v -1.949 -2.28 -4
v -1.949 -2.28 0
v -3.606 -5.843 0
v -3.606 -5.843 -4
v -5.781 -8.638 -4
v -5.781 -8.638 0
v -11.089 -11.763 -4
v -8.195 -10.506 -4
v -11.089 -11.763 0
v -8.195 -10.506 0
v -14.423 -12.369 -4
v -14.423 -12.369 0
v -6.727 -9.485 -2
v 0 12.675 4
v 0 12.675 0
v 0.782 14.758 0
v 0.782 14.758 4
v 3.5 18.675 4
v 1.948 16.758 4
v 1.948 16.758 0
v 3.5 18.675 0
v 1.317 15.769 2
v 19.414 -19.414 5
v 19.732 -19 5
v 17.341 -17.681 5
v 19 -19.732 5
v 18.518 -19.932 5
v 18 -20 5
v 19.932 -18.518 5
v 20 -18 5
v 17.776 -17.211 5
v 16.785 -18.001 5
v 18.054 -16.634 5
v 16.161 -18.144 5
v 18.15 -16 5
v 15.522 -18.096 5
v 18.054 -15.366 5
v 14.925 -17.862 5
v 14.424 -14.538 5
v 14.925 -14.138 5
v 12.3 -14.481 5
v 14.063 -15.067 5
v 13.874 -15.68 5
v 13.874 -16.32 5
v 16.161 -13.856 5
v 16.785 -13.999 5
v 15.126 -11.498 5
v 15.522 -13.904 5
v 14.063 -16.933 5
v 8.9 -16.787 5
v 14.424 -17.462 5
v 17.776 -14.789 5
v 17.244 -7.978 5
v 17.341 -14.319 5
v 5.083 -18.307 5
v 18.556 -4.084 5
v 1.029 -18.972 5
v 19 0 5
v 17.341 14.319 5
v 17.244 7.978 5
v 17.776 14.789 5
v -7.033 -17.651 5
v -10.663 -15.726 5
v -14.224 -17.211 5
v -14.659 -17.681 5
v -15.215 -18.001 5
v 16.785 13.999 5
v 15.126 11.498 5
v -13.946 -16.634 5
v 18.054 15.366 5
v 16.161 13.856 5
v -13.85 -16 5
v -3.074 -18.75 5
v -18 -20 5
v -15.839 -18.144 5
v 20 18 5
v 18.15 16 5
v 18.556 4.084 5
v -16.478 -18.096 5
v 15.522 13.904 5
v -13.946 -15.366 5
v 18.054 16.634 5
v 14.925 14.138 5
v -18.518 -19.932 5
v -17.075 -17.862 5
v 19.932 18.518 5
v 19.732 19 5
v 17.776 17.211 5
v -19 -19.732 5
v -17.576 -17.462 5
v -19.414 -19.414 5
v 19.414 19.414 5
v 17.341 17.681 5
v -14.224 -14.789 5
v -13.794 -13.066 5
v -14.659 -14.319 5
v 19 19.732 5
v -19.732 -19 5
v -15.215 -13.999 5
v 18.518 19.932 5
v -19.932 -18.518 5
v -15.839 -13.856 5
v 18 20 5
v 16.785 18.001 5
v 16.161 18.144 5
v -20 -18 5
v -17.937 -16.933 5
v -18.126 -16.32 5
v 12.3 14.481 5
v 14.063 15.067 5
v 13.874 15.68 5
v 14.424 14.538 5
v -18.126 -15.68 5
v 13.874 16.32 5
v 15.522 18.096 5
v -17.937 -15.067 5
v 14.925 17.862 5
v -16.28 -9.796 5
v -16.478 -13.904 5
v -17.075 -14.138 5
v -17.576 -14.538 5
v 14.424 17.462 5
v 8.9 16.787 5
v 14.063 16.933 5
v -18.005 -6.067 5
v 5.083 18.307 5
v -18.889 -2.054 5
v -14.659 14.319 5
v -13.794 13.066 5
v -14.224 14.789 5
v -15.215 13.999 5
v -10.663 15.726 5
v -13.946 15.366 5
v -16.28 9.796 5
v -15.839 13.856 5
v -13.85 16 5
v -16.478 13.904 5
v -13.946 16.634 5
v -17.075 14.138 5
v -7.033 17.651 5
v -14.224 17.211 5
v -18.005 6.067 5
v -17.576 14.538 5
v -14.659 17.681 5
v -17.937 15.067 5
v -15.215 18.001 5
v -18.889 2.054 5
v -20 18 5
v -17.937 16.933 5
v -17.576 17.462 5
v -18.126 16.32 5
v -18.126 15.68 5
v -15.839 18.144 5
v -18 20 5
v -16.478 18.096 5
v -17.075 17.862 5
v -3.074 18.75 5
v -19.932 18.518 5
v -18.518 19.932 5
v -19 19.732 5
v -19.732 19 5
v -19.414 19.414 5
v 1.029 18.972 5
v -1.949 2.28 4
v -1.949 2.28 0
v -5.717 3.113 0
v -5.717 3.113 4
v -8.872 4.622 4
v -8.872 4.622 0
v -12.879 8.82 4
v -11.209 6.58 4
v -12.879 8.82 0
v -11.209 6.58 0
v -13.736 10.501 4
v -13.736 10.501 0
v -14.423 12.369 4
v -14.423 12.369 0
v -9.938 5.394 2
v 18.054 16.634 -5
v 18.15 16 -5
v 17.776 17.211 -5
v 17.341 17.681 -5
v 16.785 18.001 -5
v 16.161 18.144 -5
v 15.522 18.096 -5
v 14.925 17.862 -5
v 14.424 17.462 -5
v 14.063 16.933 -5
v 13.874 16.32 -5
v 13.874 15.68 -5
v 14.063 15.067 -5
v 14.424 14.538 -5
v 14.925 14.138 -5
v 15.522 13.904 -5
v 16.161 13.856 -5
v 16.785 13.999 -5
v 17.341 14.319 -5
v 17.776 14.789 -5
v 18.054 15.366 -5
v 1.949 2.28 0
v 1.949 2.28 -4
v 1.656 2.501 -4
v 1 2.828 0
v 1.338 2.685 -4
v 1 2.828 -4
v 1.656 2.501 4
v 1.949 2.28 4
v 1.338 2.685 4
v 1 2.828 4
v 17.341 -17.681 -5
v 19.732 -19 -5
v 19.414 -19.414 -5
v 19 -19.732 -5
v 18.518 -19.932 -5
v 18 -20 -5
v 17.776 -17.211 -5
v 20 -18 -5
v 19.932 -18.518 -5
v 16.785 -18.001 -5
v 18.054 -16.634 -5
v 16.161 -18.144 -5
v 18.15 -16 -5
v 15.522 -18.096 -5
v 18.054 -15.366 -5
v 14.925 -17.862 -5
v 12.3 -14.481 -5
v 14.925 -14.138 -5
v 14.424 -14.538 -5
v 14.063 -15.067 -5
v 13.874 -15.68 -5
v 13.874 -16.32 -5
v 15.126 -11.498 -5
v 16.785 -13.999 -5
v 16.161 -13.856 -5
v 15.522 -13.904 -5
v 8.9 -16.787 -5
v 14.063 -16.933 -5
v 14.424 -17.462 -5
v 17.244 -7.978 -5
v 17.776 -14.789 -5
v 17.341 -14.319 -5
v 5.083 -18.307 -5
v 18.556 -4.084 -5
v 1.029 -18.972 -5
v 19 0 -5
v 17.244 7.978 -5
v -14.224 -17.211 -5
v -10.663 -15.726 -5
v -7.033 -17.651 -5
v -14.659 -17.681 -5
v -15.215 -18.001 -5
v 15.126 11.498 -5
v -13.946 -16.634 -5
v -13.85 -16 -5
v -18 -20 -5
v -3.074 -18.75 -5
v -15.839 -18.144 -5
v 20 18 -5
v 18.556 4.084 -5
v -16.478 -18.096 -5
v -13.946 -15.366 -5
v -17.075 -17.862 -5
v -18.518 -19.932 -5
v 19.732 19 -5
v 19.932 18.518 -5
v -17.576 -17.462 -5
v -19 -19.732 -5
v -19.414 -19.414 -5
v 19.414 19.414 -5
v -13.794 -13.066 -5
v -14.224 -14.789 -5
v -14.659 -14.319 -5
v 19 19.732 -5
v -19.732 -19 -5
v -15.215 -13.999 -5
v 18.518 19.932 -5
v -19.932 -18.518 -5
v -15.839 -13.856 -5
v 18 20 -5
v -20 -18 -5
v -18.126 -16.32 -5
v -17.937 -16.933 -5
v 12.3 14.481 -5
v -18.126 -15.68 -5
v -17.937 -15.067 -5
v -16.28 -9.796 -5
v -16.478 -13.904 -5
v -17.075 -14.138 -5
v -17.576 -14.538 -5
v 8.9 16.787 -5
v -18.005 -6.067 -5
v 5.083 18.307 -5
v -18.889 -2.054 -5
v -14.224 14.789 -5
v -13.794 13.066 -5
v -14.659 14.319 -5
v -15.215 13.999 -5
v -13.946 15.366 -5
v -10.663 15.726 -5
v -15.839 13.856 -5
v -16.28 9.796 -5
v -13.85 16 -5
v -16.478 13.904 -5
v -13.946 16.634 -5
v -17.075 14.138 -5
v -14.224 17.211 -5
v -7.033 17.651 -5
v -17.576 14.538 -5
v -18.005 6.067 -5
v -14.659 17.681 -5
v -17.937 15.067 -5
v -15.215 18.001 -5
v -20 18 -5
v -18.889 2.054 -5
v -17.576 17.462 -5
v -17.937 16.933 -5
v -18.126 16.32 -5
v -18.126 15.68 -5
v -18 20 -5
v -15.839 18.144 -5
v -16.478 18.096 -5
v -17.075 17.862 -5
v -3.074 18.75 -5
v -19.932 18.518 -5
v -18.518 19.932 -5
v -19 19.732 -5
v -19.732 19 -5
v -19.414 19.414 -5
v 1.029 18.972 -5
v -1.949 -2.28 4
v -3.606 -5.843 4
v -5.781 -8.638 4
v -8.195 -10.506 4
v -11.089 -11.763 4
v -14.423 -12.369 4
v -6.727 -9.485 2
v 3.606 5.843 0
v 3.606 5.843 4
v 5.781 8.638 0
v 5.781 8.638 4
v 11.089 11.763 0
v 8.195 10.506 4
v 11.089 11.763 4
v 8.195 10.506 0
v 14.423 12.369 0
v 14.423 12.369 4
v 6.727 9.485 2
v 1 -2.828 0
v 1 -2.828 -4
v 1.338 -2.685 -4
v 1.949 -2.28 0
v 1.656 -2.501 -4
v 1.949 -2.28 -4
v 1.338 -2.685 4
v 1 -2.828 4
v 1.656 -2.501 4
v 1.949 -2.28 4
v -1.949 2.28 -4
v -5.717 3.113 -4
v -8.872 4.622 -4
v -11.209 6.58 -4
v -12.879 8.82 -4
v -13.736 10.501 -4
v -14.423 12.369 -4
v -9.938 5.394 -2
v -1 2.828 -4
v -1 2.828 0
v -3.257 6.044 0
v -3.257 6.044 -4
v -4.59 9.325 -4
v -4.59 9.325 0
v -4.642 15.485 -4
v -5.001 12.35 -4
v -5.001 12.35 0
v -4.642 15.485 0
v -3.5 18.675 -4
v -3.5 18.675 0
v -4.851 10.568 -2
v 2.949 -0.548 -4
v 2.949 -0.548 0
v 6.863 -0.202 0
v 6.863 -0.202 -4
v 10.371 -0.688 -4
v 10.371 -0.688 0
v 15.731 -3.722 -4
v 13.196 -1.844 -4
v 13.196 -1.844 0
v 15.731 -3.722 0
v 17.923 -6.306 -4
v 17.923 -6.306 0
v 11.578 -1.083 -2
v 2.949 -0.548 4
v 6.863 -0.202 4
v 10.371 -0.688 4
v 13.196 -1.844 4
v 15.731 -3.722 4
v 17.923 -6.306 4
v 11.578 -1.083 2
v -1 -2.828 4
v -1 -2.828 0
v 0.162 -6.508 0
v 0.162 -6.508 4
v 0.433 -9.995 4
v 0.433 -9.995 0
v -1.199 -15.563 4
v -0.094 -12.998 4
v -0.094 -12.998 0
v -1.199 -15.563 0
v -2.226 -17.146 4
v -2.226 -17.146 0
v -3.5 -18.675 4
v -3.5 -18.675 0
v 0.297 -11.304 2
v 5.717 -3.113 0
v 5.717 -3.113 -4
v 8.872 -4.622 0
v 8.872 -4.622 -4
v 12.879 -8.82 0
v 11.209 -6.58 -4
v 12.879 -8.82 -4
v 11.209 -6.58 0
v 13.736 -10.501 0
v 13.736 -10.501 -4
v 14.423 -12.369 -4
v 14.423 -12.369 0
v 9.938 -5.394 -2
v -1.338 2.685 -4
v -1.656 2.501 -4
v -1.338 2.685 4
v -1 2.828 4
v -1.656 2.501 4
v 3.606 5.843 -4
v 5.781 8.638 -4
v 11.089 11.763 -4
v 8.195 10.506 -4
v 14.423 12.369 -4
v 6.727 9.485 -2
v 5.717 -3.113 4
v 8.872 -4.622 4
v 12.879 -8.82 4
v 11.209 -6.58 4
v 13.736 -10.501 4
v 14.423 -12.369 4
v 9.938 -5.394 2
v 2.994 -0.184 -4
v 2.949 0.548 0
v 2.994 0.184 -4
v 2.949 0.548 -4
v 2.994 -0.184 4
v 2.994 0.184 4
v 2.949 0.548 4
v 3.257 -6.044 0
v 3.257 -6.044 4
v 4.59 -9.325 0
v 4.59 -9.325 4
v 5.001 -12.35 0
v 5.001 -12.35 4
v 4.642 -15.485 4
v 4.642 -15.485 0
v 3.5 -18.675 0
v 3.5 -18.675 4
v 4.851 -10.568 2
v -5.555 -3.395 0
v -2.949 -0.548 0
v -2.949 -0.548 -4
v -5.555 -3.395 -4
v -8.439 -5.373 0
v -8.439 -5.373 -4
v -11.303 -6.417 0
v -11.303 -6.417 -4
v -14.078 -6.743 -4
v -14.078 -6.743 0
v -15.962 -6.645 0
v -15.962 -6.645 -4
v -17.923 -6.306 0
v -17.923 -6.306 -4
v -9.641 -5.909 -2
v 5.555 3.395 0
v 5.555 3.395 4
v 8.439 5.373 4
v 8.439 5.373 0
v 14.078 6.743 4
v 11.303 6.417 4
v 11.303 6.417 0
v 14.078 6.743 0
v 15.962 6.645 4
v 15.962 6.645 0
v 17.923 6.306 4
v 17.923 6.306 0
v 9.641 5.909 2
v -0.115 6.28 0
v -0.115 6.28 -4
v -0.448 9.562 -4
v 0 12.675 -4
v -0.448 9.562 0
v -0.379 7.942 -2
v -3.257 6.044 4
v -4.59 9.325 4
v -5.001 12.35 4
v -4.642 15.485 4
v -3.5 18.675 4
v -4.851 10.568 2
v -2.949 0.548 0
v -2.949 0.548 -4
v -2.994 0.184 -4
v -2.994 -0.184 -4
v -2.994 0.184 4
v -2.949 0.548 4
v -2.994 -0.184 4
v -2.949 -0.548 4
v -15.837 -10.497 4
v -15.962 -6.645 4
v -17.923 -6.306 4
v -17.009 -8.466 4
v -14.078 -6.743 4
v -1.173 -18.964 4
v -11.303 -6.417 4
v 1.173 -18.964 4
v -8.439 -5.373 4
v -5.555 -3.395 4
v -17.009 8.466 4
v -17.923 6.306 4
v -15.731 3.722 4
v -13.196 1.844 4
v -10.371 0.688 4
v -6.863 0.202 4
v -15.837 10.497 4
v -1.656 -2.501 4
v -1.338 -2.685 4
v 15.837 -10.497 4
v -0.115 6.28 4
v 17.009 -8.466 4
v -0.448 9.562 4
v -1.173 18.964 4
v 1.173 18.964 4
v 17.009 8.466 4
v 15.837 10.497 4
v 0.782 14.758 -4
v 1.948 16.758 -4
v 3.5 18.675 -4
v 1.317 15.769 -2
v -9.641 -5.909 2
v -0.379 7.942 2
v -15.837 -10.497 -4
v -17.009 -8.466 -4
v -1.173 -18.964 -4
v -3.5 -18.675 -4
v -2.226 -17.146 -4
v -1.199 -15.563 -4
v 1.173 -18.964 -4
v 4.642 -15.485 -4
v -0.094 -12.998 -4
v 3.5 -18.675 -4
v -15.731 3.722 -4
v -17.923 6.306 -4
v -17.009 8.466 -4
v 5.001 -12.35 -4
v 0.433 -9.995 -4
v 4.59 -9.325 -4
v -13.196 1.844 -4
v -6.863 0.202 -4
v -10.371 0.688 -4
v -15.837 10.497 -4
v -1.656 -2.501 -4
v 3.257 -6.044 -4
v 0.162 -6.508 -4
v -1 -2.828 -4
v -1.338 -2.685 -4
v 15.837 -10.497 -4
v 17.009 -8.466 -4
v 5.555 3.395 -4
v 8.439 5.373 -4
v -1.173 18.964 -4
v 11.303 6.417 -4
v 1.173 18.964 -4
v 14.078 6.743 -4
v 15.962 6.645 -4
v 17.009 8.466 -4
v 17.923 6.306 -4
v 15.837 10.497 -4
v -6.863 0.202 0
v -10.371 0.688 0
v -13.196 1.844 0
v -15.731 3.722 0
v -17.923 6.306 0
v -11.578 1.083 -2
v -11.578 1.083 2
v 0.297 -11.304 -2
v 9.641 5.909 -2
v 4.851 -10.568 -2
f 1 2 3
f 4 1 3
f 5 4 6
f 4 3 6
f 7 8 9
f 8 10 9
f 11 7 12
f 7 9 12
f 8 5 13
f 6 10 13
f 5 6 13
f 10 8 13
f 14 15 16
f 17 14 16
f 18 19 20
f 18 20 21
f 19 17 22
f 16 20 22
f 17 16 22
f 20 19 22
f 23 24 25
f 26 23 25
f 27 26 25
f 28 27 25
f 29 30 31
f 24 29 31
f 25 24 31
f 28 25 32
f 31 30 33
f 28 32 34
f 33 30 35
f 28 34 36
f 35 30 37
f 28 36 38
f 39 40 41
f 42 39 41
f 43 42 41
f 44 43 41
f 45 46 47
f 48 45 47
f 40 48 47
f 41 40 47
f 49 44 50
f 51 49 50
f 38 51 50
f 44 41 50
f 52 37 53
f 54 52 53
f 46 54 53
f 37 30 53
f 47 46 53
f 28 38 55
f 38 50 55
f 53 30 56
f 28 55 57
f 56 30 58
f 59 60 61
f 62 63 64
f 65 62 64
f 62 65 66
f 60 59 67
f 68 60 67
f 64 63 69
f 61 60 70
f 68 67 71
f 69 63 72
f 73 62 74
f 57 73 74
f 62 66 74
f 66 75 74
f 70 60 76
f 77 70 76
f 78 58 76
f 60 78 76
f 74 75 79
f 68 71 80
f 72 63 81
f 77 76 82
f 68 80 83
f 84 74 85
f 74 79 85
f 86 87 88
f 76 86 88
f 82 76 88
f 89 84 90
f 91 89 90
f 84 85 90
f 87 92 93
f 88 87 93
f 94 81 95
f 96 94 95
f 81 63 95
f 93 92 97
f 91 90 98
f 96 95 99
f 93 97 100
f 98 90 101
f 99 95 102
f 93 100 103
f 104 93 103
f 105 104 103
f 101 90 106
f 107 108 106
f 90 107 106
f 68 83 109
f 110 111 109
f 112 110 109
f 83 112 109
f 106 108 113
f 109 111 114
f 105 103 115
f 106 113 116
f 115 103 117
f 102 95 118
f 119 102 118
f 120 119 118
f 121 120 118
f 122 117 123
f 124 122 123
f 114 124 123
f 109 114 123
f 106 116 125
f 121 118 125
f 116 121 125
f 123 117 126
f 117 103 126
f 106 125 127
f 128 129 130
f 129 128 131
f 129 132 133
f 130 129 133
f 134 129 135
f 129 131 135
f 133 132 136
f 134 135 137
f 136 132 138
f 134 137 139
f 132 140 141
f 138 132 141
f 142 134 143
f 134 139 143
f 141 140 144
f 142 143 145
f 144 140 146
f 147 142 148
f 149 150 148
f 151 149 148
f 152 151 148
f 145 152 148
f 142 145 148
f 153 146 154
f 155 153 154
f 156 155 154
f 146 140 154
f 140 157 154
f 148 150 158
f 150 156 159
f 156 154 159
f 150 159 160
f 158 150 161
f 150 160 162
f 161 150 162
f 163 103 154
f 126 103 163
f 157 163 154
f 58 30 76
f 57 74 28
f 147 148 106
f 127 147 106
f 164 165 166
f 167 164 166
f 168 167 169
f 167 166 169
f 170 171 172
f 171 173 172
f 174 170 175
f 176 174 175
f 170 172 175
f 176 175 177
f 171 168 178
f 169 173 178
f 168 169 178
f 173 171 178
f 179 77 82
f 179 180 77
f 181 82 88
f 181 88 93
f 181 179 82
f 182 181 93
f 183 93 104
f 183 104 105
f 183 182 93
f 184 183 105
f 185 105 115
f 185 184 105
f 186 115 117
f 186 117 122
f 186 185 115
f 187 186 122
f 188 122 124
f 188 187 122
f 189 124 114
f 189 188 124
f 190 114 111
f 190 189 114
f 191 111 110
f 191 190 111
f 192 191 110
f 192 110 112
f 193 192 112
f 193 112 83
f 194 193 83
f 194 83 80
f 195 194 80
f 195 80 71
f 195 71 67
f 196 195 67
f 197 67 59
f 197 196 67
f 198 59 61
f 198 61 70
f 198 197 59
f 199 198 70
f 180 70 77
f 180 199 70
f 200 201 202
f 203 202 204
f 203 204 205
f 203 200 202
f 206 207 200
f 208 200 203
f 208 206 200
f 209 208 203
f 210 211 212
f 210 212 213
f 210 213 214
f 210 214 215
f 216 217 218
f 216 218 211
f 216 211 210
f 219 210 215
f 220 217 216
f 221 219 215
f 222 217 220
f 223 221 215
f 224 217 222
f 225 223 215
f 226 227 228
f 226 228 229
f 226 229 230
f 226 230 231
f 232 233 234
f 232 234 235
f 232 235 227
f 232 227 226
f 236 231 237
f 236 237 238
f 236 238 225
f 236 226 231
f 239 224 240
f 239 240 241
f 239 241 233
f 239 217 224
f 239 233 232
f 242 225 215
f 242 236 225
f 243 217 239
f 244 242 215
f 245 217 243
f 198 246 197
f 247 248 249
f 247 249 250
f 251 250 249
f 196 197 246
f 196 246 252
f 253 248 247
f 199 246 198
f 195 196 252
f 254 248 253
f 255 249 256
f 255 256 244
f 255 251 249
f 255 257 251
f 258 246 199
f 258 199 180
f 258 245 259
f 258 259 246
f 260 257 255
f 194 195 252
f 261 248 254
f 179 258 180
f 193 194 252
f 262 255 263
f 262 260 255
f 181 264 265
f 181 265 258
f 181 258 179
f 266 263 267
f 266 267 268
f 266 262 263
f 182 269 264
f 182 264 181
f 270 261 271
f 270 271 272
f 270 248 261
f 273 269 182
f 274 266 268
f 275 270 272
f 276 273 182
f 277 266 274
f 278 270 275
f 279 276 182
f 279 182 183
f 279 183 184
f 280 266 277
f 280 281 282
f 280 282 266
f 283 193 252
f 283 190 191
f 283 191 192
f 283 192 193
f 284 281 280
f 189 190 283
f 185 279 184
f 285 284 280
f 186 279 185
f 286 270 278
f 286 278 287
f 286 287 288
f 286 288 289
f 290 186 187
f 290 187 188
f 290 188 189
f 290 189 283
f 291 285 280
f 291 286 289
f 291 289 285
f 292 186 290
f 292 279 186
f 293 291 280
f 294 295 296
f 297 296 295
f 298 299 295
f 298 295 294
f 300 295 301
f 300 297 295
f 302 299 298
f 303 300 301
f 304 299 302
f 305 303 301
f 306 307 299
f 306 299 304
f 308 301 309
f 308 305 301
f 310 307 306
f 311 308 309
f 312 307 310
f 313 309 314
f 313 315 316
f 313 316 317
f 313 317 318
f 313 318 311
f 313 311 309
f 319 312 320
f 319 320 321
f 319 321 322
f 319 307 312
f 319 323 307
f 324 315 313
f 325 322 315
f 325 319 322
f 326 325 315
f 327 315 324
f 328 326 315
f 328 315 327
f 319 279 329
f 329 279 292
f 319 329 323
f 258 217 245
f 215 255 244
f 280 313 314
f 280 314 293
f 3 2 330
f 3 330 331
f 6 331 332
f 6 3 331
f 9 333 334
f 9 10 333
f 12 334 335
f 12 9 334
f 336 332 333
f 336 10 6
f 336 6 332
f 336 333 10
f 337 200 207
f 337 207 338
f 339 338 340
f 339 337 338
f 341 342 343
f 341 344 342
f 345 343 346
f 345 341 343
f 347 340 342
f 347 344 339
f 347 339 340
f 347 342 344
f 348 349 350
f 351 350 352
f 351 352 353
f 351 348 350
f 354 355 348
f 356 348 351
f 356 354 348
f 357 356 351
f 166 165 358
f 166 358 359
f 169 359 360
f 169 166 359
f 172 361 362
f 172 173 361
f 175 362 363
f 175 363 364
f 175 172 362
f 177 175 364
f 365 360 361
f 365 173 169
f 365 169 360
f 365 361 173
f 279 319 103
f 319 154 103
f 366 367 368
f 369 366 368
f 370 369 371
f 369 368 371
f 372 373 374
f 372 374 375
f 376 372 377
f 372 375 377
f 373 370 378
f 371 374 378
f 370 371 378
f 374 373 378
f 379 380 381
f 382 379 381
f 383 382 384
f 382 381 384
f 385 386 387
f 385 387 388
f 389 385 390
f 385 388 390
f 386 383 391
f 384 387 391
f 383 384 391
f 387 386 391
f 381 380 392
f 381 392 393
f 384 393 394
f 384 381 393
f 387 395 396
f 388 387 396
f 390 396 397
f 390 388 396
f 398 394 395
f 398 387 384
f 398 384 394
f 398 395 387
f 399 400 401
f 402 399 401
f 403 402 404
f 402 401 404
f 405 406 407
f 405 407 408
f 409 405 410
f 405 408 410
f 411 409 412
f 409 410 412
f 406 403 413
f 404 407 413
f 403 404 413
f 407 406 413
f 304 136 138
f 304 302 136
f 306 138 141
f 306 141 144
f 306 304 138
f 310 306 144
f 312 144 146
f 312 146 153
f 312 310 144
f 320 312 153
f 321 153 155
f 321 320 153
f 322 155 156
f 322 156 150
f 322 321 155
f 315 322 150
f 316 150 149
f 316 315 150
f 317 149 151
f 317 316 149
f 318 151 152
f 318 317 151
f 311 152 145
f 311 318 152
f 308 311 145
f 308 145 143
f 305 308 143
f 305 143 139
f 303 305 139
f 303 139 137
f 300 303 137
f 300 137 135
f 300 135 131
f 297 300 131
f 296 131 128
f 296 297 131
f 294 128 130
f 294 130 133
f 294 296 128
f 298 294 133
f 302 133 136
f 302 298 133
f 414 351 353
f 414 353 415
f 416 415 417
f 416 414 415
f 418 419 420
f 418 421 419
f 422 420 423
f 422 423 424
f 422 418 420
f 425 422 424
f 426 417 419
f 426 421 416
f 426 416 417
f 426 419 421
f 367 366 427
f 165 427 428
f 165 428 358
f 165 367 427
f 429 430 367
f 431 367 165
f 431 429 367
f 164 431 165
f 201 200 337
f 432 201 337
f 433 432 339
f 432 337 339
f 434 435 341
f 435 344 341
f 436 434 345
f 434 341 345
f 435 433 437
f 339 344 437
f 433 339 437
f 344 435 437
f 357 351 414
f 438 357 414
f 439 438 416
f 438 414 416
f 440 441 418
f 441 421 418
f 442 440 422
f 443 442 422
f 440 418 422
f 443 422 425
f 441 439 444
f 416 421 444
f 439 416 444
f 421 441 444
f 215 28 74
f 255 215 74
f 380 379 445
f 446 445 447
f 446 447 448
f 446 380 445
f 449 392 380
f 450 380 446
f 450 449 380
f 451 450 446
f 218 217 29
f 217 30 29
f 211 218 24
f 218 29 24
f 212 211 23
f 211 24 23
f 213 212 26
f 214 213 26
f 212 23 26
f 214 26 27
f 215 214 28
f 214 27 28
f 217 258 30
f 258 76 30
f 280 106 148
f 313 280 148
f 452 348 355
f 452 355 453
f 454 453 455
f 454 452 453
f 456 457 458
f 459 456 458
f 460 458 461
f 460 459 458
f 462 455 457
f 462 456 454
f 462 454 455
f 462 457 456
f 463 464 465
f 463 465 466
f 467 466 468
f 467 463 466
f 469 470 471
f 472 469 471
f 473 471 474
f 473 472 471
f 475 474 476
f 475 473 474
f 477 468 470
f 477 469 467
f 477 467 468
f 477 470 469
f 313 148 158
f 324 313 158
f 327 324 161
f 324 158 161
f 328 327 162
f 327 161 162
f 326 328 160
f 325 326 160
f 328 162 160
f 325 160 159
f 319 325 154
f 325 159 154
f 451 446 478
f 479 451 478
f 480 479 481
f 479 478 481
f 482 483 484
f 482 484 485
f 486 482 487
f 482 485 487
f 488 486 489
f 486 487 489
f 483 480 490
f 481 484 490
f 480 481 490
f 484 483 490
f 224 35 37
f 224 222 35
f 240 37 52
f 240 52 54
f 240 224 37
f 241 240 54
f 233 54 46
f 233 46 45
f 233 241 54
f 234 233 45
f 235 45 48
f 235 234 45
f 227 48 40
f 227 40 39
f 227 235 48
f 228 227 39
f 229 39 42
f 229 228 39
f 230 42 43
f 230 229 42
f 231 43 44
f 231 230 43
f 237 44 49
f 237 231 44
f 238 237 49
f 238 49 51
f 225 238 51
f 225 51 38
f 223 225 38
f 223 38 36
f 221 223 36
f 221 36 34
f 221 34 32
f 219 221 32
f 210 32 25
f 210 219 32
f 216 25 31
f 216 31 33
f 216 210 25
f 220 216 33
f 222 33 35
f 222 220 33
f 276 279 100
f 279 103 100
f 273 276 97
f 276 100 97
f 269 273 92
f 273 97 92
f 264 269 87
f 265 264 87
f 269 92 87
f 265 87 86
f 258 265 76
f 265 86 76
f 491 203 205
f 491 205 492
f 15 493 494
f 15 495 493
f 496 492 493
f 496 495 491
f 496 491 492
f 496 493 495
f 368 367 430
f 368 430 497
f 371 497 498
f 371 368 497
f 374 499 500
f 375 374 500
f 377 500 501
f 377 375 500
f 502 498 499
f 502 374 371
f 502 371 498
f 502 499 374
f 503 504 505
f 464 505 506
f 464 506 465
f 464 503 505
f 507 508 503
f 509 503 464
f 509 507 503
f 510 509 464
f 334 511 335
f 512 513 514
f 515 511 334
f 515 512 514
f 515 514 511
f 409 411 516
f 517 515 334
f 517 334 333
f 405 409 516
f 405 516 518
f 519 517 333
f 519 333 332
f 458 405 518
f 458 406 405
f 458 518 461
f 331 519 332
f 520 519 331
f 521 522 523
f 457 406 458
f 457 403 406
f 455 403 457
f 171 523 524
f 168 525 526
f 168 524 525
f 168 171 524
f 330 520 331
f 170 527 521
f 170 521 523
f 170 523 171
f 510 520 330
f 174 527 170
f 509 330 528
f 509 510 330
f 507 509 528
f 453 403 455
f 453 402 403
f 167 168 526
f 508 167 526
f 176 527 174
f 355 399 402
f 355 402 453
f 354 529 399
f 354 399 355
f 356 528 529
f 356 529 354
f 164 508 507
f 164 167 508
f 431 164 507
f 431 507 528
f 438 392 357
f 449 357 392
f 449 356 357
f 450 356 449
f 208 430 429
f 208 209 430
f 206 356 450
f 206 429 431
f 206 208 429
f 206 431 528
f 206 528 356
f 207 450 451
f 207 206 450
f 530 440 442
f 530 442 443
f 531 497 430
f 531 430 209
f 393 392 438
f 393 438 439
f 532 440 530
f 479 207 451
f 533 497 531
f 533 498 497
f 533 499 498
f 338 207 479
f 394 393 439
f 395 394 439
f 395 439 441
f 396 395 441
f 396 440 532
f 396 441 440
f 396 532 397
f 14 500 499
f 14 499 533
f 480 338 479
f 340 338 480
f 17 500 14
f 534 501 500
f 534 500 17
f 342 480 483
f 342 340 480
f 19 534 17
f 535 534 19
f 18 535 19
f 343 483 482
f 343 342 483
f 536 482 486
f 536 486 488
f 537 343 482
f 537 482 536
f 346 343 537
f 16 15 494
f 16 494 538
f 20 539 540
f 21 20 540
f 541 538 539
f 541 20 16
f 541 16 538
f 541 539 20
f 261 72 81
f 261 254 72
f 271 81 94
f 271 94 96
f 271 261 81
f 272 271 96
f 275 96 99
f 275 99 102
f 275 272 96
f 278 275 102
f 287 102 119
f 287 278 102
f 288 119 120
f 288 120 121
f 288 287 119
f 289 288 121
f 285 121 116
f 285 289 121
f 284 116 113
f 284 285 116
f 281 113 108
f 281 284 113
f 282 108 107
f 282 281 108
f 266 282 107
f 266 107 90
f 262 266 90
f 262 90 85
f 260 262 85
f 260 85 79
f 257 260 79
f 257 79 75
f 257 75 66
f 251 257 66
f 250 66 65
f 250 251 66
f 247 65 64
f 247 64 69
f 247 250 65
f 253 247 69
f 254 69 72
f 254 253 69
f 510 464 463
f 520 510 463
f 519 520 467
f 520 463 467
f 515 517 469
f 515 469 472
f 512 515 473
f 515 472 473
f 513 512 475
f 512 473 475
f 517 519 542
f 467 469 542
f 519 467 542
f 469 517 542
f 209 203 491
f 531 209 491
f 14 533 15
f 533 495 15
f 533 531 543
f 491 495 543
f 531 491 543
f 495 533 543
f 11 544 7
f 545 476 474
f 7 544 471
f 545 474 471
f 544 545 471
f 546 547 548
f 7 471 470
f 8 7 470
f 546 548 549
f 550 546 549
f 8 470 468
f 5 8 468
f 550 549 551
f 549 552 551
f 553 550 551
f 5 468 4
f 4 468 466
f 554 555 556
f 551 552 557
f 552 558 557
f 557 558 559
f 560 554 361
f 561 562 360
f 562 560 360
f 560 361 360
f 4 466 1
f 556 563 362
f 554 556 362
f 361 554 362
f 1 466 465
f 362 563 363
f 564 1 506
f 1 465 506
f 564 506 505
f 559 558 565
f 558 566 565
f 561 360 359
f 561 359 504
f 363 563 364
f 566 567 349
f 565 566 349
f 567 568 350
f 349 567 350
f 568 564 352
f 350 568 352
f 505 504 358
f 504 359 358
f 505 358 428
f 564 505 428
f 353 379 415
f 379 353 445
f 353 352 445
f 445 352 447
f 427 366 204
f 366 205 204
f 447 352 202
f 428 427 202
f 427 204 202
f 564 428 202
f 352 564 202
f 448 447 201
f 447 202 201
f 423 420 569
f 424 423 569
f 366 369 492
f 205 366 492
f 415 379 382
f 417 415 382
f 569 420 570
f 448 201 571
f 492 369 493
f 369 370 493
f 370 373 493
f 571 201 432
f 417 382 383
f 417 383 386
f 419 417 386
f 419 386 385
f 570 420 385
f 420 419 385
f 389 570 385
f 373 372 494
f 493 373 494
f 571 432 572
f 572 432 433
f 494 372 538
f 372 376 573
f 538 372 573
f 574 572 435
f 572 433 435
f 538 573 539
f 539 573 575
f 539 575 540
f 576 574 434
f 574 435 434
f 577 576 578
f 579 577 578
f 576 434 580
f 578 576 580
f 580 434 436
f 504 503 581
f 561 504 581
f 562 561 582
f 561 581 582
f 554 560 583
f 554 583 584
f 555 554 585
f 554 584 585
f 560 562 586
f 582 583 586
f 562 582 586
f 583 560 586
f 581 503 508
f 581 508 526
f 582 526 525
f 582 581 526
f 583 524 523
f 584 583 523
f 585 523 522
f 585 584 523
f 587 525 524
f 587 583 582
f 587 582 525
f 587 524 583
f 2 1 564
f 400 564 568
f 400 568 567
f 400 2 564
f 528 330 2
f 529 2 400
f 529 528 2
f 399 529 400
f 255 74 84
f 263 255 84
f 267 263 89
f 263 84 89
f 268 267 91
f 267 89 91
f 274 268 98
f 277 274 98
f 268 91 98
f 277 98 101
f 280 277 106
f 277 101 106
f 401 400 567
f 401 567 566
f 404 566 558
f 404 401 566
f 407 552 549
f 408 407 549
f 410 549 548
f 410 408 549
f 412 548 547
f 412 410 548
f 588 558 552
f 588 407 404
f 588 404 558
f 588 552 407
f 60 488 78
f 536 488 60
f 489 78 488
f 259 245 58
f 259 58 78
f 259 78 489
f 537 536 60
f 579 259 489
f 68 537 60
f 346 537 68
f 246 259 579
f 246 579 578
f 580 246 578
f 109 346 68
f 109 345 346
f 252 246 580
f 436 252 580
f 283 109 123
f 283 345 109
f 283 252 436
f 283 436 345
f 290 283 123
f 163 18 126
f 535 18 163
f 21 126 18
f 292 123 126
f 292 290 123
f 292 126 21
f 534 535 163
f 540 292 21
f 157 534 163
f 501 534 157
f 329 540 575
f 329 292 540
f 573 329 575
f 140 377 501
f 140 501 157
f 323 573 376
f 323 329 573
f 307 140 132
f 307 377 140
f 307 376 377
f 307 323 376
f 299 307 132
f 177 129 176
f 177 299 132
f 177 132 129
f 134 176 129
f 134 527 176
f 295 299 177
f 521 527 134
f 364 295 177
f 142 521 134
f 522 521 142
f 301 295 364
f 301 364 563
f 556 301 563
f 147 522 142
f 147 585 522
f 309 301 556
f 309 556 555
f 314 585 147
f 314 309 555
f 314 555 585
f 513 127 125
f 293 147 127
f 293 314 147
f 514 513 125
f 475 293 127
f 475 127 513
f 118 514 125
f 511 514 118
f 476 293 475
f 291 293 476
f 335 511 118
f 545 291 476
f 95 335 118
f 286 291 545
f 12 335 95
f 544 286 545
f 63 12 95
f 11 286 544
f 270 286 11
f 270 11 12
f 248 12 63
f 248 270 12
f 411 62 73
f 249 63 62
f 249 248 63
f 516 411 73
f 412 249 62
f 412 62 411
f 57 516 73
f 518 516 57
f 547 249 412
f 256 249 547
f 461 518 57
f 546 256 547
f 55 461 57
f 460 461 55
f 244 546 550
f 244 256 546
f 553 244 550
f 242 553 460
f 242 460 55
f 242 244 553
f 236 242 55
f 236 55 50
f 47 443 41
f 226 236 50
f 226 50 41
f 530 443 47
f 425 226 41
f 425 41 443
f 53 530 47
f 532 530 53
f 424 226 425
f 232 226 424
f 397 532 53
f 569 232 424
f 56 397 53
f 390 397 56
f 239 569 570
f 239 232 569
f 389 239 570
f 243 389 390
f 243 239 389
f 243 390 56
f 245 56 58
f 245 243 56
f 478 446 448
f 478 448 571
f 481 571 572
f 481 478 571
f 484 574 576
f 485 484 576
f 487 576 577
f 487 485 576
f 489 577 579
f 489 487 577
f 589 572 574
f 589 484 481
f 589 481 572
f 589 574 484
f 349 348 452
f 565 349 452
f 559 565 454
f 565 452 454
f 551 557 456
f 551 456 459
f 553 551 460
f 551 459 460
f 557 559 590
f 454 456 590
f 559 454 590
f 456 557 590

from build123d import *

# Parameters (mm, degrees)
SKETCH1_R           = 2.15
BOSS_EXTRUDE1_DEPTH = 5
BOSS_EXTRUDE2_DEPTH = 4


with BuildPart() as part:
    # Sketch1 → Boss-Extrude1 (new, symmetric)
    with BuildSketch(Plane.XY):
        with BuildLine():
            ThreePointArc((-20, -18), (-19.414213562, -19.414213562), (-18, -20))
            Line((-18, -20), (18, -20))
            ThreePointArc((18, -20), (19.414213562, -19.414213562), (20, -18))
            Line((20, -18), (20, 18))
            ThreePointArc((20, 18), (19.414213562, 19.414213562), (18, 20))
            Line((18, 20), (-18, 20))
            ThreePointArc((-18, 20), (-19.414213562, 19.414213562), (-20, 18))
            Line((-20, 18), (-20, -18))
        make_face()
        with Locations((-16, -16)):
            Circle(SKETCH1_R, mode=Mode.SUBTRACT)
        with Locations((16, -16)):
            Circle(SKETCH1_R, mode=Mode.SUBTRACT)
        with BuildLine():
            ThreePointArc((17.92289399, 6.306335785), (18.728787812, 3.19882902), (19, 0))
            ThreePointArc((19, 0), (18.728787812, -3.19882902), (17.92289399, -6.306335785))
            ThreePointArc((17.92289399, -6.306335785), (16.454482672, -9.5), (14.42289399, -12.368513612))
            ThreePointArc((14.42289399, -12.368513612), (9.5, -16.454482672), (3.5, -18.674849397))
            ThreePointArc((3.5, -18.674849397), (0, -19), (-3.5, -18.674849397))
            ThreePointArc((-3.5, -18.674849397), (-9.5, -16.454482672), (-14.42289399, -12.368513612))
            ThreePointArc((-14.42289399, -12.368513612), (-16.454482672, -9.5), (-17.92289399, -6.306335785))
            ThreePointArc((-17.92289399, -6.306335785), (-19, 0), (-17.92289399, 6.306335785))
            ThreePointArc((-17.92289399, 6.306335785), (-16.454482672, 9.5), (-14.42289399, 12.368513612))
            ThreePointArc((-14.42289399, 12.368513612), (-9.5, 16.454482672), (-3.5, 18.674849397))
            ThreePointArc((-3.5, 18.674849397), (0, 19), (3.5, 18.674849397))
            ThreePointArc((3.5, 18.674849397), (9.5, 16.454482672), (14.42289399, 12.368513612))
            ThreePointArc((14.42289399, 12.368513612), (16.454482672, 9.5), (17.92289399, 6.306335785))
        make_face(mode=Mode.SUBTRACT)
        with Locations((-16, 16)):
            Circle(SKETCH1_R, mode=Mode.SUBTRACT)
        with Locations((16, 16)):
            Circle(SKETCH1_R, mode=Mode.SUBTRACT)
    extrude(amount=BOSS_EXTRUDE1_DEPTH, both=True)

    # Sketch1<5> → Boss-Extrude2 (add, symmetric)
    with BuildSketch(Plane.XY):
        with BuildLine():
            add(Edge.make_bspline(
                [(2.949489743, 0.548188159), (8.845203175, 8.391149402), (17.92289399, 6.306335785)],
                knots=[0, 0, 0, 1, 1, 1], degree=2))
            ThreePointArc((17.92289399, 6.306335785), (16.454482672, 9.5), (14.42289399, 12.368513612))
            add(Edge.make_bspline(
                [(1.949489743, 2.280238966), (5.266917454, 11.646464502), (14.42289399, 12.368513612)],
                knots=[0, 0, 0, 1, 1, 1], degree=2))
            ThreePointArc((1.949489743, 2.280238966), (1.5, 2.598076211), (1, 2.828427125))
            add(Edge.make_bspline(
                [(1, 2.828427125), (-1.258927409, 8.1328538), (0, 12.674849397)],
                knots=[0, 0, 0, 0.587597174, 0.587597174, 0.587597174], degree=2))
            add(Edge.make_bspline(
                [(0, 12.674849397), (0.883573382, 15.862631615), (3.5, 18.674849397)],
                knots=[0.587597174, 0.587597174, 0.587597174, 1, 1, 1], degree=2))
            ThreePointArc((3.5, 18.674849397), (0, 19), (-3.5, 18.674849397))
            add(Edge.make_bspline(
                [(-1, 2.828427125), (-7.452675396, 10.384516566), (-3.5, 18.674849397)],
                knots=[0, 0, 0, 1, 1, 1], degree=2))
            ThreePointArc((-1, 2.828427125), (-1.5, 2.598076211), (-1.949489743, 2.280238966))
            add(Edge.make_bspline(
                [(-1.949489743, 2.280238966), (-11.689550136, 3.46459595), (-14.42289399, 12.368513612)],
                knots=[0, 0, 0, 1, 1, 1], degree=2))
            ThreePointArc((-14.42289399, 12.368513612), (-16.454482672, 9.5), (-17.92289399, 6.306335785))
            add(Edge.make_bspline(
                [(-2.949489743, 0.548188159), (-12.71959285, -1.261947936), (-17.92289399, 6.306335785)],
                knots=[0, 0, 0, 1, 1, 1], degree=2))
            ThreePointArc((-2.949489743, 0.548188159), (-3, 0), (-2.949489743, -0.548188159))
            add(Edge.make_bspline(
                [(-2.949489743, -0.548188159), (-8.845203175, -8.391149402), (-17.92289399, -6.306335785)],
                knots=[0, 0, 0, 1, 1, 1], degree=2))
            ThreePointArc((-17.92289399, -6.306335785), (-16.454482672, -9.5), (-14.42289399, -12.368513612))
            add(Edge.make_bspline(
                [(-1.949489743, -2.280238966), (-5.266917454, -11.646464502), (-14.42289399, -12.368513612)],
                knots=[0, 0, 0, 1, 1, 1], degree=2))
            ThreePointArc((-1.949489743, -2.280238966), (-1.5, -2.598076211), (-1, -2.828427125))
            add(Edge.make_bspline(
                [(-1, -2.828427125), (2.844346961, -11.855745352), (-3.5, -18.674849397)],
                knots=[0, 0, 0, 1, 1, 1], degree=2))
            ThreePointArc((-3.5, -18.674849397), (0, -19), (3.5, -18.674849397))
            add(Edge.make_bspline(
                [(1, -2.828427125), (7.452675396, -10.384516566), (3.5, -18.674849397)],
                knots=[0, 0, 0, 1, 1, 1], degree=2))
            ThreePointArc((1, -2.828427125), (1.5, -2.598076211), (1.949489743, -2.280238966))
            add(Edge.make_bspline(
                [(1.949489743, -2.280238966), (11.689550136, -3.46459595), (14.42289399, -12.368513612)],
                knots=[0, 0, 0, 1, 1, 1], degree=2))
            ThreePointArc((14.42289399, -12.368513612), (16.454482672, -9.5), (17.92289399, -6.306335785))
            add(Edge.make_bspline(
                [(2.949489743, -0.548188159), (12.71959285, 1.261947936), (17.92289399, -6.306335785)],
                knots=[0, 0, 0, 1, 1, 1], degree=2))
            ThreePointArc((2.949489743, -0.548188159), (3, 0), (2.949489743, 0.548188159))
        make_face()
    extrude(amount=BOSS_EXTRUDE2_DEPTH, both=True)


solid = part.part
